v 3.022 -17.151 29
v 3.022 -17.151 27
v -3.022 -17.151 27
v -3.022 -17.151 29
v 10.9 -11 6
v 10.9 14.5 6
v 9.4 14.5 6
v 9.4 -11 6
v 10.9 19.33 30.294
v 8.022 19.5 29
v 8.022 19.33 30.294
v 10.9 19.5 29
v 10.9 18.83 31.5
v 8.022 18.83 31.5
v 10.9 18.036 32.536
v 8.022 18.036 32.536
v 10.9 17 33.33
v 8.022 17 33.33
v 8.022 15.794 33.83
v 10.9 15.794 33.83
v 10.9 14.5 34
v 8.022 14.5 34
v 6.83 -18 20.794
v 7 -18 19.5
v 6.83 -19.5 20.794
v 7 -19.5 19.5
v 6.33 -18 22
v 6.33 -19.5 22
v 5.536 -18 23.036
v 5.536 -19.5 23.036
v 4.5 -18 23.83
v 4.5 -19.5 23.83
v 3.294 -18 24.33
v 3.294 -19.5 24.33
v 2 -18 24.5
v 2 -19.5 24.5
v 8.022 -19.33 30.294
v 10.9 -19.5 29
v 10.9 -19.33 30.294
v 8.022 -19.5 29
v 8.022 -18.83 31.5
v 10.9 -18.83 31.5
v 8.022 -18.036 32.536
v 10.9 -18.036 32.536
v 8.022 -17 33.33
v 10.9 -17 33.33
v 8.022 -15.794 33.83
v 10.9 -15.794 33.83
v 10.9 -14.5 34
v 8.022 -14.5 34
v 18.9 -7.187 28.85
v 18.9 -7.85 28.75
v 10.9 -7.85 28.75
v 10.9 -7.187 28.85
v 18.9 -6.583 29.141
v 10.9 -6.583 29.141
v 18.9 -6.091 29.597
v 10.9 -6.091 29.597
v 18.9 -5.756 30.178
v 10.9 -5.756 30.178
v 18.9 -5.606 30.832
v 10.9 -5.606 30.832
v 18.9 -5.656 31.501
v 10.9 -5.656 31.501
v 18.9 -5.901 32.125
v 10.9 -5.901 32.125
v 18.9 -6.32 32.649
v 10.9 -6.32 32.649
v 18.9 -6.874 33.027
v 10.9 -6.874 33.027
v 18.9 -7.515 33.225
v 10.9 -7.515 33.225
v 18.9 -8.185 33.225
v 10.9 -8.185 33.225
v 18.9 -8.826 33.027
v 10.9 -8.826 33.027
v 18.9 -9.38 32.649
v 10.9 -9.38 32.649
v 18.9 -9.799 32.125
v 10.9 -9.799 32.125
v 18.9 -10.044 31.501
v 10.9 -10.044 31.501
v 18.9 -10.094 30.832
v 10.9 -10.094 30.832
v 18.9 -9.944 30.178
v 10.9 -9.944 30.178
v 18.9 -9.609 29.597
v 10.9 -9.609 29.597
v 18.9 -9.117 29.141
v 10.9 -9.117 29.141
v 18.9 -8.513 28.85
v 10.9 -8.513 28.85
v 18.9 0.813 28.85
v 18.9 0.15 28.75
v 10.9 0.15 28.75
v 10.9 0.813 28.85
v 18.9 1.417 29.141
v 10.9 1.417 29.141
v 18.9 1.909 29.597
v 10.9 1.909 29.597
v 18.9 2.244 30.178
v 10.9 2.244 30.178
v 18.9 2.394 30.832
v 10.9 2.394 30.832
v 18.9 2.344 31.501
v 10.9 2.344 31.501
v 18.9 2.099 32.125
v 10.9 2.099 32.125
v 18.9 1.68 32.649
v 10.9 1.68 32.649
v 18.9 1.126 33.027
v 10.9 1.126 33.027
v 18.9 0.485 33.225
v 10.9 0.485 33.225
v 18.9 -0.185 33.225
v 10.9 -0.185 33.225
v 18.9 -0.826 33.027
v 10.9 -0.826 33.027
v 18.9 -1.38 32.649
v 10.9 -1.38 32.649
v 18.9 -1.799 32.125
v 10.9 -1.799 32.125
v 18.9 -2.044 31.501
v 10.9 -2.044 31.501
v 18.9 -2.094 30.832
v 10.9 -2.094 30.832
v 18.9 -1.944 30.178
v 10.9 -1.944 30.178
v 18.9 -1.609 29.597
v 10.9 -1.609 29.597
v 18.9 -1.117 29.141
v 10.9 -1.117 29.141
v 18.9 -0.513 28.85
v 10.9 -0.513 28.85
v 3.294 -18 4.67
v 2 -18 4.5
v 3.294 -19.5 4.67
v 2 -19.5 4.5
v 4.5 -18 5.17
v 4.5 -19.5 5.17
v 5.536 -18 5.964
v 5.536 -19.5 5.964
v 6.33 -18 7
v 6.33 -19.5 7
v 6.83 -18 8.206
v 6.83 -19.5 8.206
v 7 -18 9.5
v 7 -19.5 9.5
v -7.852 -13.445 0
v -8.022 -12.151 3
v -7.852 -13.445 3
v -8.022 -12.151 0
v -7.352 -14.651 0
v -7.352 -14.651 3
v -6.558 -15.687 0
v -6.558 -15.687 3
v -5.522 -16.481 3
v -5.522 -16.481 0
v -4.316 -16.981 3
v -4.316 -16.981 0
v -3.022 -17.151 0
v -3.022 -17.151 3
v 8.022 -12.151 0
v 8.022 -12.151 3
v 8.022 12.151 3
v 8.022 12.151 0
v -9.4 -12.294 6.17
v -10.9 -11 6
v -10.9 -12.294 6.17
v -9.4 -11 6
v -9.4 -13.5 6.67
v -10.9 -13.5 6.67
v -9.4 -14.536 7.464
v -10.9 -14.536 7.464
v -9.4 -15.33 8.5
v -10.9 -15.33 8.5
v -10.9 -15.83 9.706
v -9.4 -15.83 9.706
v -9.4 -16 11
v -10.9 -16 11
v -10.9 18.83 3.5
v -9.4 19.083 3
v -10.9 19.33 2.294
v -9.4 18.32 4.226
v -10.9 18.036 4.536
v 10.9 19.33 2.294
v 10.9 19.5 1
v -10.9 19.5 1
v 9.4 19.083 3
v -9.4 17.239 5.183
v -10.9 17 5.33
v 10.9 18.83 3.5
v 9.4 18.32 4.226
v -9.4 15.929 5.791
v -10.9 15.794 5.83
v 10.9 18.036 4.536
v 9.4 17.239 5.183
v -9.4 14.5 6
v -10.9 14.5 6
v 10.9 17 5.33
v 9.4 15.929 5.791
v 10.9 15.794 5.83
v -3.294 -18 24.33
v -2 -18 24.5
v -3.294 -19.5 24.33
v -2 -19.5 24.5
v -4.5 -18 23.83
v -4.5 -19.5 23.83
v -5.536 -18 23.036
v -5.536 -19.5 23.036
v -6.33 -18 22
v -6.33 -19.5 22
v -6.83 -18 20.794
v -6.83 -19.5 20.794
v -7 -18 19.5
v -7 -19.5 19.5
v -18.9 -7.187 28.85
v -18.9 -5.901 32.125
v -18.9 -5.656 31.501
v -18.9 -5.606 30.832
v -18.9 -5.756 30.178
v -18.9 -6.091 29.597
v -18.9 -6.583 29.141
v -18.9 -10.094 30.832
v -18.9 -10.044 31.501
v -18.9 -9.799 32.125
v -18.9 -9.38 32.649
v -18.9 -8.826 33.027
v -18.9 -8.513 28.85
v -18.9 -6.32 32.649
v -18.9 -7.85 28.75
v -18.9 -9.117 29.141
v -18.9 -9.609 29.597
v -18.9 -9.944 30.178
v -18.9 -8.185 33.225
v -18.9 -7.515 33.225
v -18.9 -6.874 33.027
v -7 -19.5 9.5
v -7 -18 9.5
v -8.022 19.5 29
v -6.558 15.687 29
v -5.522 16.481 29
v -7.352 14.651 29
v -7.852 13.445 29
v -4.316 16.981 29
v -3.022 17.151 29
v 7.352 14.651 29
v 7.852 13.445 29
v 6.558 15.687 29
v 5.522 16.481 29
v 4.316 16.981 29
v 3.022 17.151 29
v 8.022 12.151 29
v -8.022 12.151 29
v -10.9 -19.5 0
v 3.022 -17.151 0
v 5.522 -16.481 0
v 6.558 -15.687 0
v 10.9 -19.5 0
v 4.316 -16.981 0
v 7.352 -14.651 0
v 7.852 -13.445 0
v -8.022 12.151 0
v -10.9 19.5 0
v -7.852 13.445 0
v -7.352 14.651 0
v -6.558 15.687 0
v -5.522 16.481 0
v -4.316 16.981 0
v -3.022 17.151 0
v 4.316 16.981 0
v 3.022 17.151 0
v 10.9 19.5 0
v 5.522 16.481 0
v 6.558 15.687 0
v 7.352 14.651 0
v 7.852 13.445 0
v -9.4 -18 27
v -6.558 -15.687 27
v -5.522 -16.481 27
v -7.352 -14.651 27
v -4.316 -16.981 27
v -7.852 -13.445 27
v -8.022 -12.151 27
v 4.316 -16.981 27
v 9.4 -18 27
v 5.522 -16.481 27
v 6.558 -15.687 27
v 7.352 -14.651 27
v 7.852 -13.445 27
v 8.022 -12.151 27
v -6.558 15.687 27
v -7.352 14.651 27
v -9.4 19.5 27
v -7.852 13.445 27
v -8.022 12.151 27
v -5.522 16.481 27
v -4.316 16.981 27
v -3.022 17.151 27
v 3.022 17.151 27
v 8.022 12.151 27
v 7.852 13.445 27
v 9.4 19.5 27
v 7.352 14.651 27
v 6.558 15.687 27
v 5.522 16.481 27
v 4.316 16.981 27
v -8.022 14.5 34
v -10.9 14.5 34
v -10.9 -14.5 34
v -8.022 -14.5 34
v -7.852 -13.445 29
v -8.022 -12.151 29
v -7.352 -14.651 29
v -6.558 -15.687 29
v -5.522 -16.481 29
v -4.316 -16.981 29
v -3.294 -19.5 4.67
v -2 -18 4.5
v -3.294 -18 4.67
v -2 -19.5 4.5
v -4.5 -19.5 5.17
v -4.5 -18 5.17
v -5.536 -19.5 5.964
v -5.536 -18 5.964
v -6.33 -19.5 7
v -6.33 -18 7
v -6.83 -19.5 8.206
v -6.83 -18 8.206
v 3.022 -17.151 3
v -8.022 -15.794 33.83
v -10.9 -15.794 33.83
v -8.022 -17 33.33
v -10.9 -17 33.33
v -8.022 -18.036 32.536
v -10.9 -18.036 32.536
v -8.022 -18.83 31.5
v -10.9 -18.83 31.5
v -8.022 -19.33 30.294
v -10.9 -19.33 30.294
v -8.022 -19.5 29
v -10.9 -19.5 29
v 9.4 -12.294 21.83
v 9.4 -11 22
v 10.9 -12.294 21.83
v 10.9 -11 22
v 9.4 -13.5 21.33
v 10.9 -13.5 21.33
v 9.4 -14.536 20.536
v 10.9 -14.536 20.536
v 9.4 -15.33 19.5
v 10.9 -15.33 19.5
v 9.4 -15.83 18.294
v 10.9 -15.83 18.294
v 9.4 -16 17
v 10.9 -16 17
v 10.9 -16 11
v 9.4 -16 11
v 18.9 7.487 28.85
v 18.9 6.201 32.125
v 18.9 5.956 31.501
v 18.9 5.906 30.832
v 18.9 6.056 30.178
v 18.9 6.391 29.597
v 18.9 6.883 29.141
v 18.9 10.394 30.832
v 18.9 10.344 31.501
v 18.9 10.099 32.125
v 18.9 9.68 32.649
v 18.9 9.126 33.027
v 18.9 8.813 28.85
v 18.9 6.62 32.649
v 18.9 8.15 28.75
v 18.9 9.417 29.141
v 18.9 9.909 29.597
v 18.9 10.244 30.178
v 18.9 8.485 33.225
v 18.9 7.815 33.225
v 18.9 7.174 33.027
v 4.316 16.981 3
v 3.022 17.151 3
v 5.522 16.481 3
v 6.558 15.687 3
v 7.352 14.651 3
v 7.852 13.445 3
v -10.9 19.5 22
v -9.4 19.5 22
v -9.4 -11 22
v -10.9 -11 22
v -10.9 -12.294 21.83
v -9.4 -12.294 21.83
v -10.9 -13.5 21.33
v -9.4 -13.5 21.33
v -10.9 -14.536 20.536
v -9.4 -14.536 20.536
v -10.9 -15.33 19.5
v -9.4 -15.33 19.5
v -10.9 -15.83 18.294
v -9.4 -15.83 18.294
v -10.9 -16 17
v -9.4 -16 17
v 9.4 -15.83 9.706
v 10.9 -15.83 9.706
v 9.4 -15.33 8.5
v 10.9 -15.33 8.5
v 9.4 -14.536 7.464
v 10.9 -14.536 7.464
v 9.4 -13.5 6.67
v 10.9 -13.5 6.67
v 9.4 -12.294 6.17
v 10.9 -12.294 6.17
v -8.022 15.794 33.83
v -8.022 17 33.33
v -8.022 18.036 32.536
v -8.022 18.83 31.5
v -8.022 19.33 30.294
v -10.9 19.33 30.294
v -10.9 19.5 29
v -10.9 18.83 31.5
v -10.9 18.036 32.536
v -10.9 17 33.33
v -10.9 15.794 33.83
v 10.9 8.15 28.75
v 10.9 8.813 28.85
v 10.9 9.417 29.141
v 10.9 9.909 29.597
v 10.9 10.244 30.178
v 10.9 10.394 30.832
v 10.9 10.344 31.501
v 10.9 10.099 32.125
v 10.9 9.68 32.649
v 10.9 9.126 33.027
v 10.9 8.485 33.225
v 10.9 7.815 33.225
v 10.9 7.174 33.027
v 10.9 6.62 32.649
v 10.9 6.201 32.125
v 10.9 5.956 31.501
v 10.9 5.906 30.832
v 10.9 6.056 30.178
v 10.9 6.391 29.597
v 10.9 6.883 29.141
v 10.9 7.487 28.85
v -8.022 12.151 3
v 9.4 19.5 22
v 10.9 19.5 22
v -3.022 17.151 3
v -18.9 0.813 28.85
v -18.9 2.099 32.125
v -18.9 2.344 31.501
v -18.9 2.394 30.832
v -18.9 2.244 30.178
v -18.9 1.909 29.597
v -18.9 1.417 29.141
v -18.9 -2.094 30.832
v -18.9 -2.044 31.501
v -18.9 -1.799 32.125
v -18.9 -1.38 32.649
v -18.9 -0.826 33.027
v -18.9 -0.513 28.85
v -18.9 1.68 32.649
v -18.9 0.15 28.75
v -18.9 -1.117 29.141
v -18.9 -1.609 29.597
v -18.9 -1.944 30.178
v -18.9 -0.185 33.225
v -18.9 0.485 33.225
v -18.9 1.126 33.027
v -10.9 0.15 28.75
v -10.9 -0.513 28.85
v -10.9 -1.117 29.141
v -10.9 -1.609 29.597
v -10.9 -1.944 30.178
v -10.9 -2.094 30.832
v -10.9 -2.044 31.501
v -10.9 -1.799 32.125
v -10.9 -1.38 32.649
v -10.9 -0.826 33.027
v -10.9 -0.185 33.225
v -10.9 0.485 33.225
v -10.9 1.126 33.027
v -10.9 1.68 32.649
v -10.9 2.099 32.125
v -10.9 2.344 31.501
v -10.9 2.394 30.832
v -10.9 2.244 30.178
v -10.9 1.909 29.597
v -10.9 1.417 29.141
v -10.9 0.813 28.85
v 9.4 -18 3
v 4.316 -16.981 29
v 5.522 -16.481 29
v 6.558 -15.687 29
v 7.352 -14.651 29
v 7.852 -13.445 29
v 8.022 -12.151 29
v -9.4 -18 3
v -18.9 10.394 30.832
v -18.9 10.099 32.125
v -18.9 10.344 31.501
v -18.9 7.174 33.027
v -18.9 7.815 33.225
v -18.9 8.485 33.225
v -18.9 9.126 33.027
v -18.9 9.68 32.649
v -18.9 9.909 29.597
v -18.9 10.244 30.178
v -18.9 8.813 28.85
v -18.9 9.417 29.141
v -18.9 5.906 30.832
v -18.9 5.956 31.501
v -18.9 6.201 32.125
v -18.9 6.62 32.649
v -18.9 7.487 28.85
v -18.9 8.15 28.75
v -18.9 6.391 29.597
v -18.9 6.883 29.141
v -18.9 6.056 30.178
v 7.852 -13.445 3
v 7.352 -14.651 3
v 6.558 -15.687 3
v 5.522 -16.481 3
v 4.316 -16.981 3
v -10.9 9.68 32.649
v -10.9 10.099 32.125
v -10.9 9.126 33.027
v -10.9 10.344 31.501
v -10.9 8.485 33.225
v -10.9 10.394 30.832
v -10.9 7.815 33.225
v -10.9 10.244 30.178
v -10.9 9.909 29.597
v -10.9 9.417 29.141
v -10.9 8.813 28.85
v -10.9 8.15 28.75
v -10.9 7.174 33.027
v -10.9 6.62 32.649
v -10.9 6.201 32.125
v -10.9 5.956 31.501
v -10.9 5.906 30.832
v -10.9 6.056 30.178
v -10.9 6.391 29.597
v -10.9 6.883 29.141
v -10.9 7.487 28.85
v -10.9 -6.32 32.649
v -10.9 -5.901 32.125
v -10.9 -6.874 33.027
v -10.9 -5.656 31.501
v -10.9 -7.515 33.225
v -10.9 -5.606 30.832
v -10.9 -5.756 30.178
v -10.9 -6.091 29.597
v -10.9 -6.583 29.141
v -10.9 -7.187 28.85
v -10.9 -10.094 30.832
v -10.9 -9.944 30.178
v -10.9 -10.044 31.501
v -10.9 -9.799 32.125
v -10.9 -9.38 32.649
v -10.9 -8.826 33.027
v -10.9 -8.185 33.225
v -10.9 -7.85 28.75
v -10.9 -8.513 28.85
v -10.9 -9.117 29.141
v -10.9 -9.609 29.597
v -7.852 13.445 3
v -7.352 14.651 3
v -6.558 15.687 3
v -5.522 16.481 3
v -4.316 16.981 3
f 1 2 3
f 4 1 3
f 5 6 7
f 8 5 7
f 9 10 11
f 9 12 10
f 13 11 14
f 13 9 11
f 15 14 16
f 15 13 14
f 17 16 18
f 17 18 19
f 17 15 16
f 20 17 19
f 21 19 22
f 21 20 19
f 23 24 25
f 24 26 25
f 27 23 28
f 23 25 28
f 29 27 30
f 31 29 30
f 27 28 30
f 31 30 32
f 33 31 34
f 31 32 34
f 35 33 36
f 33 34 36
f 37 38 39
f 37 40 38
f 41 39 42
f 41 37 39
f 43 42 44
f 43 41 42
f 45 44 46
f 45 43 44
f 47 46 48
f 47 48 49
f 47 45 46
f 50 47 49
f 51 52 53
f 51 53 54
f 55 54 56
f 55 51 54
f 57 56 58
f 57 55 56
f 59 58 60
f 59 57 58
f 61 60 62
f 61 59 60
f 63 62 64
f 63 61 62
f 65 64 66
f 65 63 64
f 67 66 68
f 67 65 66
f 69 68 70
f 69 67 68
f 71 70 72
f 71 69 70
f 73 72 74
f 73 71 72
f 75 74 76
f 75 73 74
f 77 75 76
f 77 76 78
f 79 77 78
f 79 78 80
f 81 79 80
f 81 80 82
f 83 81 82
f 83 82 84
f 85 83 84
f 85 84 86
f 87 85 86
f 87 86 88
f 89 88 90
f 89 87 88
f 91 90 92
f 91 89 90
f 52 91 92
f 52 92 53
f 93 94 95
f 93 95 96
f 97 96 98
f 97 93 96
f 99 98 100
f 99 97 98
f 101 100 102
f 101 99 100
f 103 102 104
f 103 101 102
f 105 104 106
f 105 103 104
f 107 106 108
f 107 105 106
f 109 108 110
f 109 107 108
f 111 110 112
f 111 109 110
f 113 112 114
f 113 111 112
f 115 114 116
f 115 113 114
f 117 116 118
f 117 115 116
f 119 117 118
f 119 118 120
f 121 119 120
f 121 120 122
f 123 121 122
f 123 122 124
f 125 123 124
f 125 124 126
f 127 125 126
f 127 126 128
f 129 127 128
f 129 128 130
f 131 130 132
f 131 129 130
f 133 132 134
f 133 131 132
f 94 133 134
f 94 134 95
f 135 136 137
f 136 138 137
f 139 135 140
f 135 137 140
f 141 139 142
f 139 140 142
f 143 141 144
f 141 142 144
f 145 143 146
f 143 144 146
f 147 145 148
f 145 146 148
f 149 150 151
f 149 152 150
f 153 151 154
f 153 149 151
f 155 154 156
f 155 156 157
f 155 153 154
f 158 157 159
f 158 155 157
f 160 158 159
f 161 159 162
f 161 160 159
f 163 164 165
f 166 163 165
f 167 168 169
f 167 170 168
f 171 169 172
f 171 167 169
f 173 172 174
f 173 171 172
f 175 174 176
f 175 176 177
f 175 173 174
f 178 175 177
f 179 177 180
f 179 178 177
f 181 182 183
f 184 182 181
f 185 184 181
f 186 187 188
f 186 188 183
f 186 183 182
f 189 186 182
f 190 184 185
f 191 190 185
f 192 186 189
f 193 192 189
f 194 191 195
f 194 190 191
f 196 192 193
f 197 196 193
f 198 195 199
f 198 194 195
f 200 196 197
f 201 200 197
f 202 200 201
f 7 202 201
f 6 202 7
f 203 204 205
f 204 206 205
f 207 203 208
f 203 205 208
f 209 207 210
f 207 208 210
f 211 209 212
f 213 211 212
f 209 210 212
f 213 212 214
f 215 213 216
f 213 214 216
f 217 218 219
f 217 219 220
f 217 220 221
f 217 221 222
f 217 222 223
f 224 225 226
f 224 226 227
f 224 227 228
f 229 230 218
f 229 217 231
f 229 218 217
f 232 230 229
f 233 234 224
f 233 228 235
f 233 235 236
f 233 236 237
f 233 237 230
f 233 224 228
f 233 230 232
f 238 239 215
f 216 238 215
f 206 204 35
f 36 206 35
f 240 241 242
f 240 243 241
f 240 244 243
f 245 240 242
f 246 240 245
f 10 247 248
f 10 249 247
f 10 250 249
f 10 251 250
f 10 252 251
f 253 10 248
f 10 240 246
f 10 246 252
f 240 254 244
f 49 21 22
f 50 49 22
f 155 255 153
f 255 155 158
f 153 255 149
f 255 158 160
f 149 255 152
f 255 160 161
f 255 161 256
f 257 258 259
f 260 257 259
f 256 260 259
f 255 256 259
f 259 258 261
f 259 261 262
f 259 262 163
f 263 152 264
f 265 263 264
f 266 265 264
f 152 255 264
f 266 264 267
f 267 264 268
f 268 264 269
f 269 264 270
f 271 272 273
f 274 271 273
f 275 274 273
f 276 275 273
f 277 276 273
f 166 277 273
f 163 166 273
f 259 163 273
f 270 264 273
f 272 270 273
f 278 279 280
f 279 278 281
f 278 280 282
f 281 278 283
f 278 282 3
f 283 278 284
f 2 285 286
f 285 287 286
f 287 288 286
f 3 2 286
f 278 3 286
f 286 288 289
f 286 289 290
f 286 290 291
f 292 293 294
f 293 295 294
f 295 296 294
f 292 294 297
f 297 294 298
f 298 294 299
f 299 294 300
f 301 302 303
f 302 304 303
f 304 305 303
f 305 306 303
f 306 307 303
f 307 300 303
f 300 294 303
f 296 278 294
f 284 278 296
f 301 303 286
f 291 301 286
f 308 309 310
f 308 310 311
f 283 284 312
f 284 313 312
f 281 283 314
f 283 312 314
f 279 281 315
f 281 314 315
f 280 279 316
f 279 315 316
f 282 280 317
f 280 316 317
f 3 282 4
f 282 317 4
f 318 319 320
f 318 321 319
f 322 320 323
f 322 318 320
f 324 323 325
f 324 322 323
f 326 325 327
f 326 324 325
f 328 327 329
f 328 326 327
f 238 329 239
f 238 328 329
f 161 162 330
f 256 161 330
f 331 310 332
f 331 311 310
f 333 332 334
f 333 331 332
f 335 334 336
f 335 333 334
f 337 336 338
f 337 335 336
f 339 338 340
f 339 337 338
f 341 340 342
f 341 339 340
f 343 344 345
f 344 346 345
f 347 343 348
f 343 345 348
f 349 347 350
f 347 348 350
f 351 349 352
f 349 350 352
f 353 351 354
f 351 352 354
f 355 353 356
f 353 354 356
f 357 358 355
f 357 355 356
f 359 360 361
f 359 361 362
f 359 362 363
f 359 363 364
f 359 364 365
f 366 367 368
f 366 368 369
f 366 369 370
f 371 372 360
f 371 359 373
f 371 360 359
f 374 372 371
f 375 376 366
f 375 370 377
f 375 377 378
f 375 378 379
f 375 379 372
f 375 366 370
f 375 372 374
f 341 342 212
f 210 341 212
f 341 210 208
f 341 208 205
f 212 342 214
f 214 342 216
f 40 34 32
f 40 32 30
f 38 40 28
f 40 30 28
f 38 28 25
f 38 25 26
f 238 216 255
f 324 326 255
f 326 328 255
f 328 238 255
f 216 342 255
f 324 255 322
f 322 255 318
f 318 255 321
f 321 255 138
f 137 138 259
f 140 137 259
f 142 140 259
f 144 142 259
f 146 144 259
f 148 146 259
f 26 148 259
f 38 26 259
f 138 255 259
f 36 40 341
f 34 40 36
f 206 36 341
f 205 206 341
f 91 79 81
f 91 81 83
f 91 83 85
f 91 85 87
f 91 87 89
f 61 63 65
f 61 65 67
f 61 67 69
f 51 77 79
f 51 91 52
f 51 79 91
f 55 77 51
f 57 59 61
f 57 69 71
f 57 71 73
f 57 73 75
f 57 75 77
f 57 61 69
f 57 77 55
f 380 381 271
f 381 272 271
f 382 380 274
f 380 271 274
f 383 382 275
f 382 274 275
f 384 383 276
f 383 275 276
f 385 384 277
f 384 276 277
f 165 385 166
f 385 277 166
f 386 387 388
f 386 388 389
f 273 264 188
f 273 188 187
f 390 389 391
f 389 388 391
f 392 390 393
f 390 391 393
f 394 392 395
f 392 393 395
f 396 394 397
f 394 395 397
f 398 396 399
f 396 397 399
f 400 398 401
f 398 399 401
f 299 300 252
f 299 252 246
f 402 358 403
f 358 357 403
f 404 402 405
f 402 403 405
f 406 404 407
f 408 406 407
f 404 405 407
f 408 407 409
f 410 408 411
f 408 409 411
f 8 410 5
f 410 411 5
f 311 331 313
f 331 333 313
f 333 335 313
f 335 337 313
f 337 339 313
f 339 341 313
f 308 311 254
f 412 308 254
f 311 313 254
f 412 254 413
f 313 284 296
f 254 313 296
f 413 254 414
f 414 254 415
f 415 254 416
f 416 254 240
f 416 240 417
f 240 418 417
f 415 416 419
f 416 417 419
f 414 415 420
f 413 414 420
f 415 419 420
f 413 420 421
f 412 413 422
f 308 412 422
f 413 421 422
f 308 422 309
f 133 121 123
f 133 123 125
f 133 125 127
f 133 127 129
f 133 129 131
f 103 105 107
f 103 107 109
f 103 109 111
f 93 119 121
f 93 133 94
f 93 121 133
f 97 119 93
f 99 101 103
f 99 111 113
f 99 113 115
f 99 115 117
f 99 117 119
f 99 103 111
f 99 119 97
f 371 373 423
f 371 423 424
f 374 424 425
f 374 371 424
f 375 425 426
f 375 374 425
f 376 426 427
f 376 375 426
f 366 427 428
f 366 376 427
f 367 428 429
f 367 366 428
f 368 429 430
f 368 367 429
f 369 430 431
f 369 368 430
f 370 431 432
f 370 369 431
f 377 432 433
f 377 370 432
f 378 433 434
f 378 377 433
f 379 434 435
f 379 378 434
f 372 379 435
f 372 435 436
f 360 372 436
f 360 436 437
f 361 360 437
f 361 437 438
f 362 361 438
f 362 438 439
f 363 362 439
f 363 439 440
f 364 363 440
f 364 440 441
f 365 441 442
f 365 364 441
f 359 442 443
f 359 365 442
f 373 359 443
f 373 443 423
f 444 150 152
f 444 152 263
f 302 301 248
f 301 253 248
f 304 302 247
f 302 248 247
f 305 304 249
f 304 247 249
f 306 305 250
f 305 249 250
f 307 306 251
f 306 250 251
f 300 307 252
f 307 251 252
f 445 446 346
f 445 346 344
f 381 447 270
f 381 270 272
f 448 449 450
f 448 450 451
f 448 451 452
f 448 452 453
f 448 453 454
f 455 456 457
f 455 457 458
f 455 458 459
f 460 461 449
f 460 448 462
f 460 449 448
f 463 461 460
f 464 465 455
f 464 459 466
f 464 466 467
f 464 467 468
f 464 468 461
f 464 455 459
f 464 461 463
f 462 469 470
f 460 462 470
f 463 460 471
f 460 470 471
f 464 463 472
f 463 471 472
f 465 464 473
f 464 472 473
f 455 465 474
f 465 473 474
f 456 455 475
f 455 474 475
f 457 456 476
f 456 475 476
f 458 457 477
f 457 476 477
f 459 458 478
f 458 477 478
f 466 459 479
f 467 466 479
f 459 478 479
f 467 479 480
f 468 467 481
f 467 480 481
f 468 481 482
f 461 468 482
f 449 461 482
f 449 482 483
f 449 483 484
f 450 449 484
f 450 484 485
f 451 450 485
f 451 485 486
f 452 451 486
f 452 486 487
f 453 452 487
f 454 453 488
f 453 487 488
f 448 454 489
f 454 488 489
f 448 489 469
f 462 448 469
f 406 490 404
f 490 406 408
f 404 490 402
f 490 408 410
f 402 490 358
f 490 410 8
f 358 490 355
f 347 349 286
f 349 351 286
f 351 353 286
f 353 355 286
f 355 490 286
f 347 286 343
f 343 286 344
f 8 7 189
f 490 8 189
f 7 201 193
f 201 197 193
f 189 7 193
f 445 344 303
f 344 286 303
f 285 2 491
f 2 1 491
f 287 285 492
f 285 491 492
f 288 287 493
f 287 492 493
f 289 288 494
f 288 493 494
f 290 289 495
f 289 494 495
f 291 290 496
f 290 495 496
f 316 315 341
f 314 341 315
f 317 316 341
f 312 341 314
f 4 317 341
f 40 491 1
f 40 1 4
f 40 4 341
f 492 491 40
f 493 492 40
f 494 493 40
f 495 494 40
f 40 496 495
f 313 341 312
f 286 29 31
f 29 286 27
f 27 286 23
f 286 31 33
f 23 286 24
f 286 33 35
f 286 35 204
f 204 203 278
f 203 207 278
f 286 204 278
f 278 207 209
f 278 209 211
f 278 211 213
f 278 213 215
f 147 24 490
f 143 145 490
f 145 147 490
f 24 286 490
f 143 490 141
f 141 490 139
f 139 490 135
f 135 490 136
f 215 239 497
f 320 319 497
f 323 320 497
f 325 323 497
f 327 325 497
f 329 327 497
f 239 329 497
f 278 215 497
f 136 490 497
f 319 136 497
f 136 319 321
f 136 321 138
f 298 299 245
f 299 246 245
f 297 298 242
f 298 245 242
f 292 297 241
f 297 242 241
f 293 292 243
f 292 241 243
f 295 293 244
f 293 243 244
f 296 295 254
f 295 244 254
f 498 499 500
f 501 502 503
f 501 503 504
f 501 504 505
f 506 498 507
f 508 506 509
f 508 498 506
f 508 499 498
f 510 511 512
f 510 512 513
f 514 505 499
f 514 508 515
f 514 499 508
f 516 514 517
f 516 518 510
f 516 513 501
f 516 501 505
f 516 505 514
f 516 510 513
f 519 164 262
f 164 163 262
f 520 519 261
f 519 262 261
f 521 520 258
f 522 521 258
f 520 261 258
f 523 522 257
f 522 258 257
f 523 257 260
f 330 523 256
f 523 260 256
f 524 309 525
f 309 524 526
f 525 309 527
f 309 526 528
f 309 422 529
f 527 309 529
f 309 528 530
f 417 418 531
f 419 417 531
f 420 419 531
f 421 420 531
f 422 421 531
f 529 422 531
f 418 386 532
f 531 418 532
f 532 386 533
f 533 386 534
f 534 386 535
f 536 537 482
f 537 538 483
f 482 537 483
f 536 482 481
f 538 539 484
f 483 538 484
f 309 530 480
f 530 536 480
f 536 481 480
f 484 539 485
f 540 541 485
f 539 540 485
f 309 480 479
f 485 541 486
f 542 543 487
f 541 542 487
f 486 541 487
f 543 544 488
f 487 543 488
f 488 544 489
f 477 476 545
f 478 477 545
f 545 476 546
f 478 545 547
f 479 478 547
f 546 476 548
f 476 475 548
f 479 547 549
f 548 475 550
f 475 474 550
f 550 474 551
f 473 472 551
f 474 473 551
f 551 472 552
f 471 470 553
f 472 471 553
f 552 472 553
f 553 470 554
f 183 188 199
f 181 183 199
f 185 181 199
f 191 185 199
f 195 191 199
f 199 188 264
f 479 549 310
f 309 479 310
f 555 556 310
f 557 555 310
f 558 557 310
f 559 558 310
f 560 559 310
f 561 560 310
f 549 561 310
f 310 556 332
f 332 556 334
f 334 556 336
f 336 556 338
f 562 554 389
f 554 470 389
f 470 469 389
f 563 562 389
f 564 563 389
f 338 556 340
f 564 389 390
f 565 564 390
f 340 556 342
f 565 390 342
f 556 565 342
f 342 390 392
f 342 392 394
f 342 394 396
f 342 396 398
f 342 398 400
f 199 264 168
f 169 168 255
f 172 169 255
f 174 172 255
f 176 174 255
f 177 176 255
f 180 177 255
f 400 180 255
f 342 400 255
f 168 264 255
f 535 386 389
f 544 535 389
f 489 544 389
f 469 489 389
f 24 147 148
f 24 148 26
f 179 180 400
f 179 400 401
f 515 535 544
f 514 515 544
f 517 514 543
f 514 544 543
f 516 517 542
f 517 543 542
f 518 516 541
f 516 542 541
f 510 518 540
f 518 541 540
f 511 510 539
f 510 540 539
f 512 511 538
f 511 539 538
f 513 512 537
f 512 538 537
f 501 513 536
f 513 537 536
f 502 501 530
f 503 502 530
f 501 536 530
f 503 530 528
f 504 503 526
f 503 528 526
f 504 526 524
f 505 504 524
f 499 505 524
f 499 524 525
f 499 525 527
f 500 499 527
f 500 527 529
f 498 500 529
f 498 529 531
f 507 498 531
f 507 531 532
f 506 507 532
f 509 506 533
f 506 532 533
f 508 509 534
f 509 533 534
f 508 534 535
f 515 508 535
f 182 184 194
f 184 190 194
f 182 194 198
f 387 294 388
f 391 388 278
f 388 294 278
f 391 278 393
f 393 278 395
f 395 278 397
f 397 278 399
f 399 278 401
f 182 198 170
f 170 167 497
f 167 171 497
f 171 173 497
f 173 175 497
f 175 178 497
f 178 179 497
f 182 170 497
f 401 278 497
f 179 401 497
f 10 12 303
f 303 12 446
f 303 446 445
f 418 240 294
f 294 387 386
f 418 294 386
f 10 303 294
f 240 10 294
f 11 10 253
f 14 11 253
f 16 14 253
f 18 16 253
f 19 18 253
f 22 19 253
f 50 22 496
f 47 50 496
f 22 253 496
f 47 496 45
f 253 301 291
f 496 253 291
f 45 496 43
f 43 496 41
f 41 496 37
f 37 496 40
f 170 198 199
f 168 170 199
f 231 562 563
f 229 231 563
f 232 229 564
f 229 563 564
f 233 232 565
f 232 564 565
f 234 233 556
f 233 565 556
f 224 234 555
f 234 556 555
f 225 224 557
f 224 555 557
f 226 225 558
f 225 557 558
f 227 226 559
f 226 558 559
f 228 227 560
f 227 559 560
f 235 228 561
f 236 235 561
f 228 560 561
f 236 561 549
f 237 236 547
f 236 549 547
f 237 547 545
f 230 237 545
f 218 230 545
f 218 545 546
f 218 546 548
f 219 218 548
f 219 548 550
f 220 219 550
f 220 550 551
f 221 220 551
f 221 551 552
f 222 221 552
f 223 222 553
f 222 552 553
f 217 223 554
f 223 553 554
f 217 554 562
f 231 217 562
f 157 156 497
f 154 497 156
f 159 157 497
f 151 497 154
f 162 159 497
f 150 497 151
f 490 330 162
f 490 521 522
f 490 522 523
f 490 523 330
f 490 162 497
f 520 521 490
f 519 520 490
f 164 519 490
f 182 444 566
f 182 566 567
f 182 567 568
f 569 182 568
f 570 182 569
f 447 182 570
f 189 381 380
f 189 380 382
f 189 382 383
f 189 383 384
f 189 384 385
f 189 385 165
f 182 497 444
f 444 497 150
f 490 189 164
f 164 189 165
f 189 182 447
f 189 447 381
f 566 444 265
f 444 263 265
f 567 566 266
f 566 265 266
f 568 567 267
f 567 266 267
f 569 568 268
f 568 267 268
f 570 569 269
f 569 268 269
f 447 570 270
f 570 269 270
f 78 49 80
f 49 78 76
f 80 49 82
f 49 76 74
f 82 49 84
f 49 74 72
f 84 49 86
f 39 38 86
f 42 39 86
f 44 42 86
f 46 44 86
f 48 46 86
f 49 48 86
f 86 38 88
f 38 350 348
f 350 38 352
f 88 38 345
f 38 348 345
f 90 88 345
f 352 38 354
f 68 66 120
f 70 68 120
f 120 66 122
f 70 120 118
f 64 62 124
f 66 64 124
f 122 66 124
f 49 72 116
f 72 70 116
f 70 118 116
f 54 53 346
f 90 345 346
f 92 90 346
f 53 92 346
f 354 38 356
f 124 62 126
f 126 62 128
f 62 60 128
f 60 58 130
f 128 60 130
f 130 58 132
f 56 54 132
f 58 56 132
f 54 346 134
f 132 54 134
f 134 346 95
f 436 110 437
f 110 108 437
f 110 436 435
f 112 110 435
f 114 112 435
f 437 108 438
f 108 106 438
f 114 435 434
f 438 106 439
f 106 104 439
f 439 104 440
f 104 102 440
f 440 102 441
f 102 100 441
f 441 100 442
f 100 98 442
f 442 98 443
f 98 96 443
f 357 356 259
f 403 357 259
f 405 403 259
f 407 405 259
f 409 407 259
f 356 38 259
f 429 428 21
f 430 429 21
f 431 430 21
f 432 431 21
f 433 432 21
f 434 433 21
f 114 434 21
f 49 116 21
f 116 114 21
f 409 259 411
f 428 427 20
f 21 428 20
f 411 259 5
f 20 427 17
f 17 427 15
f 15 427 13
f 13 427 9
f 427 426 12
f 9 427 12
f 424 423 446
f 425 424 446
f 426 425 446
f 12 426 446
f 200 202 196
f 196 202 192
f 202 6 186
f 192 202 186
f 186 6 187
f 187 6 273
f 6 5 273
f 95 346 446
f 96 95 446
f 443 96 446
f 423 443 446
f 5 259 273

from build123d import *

# Parameters (mm, degrees)
SKETCH1_W               = 21.8
SKETCH1_H               = 39
BOSS_EXTRUDE1_DEPTH     = 3
BOSS_EXTRUDE2_DEPTH     = 3
BOSS_EXTRUDE4_DEPTH     = 21
SKETCH4_W               = 21.8
SKETCH4_H               = 39
BOSS_EXTRUDE5_DEPTH     = 2
CUT_EXTRUDE1_DEPTH      = 50.807730324
CUT_EXTRUDE1_DEPTH_BACK = 50.807730324
SKETCH5_W               = 14
SKETCH5_H               = 20
BOSS_EXTRUDE6_DEPTH     = 5
SKETCH7_W               = 14.6
SKETCH7_H               = 1.5
CUT_EXTRUDE2_DEPTH      = 2
SKETCH8_W               = 16.04420395
SKETCH8_H               = 34.30198165
CUT_EXTRUDE3_DEPTH      = 35.279148181
SKETCH9_W               = 16.04420395
SKETCH9_H               = 34.30198165
CUT_EXTRUDE4_DEPTH      = 2
SKETCH10_W              = 2.1
SKETCH10_H              = 1.5
CUT_EXTRUDE5_DEPTH      = 2
SKETCH11_W              = 2.1
SKETCH11_H              = 1.5
CUT_EXTRUDE6_DEPTH      = 2
SKETCH13_W              = 18.8
SKETCH13_H              = 1.5
CUT_EXTRUDE7_DEPTH      = 3
FILLET3_R               = 5
FILLET4_R               = 5
SKETCH17_W              = 1.5
SKETCH17_H              = 16
BOSS_EXTRUDE8_DEPTH     = 2
FILLET5_R               = 5
BOSS_EXTRUDE9_DEPTH     = 5
SKETCH24_R              = 2.25
BOSS_EXTRUDE10_DEPTH    = 8
BOSS_EXTRUDE11_START    = 8
SKETCH25_R              = 2.25
BOSS_EXTRUDE11_DEPTH    = 8
FILLET7_R               = 5


with BuildPart() as part:
    # Sketch1 → Boss-Extrude1 (new body)
    with BuildSketch(Plane.XY):
        Rectangle(SKETCH1_W, SKETCH1_H)
    extrude(amount=BOSS_EXTRUDE1_DEPTH)

    # Sketch2 → Boss-Extrude2 (add)
    with BuildSketch(Plane.XY.offset(3)):
        Polygon((-10.9, 19.5), (-9.4, 19.5), (-9.4, -18), (9.4, -18), (9.4, 19.5), (10.9, 19.5), (10.9, -19.5), (-10.9, -19.5), align=None)
    extrude(amount=BOSS_EXTRUDE2_DEPTH)

    # Sketch3 → Boss-Extrude4 (add)
    with BuildSketch(Plane.XY.offset(6)):
        Polygon((-9.4, -18), (-10.9, -18), (-10.9, -19.5), (10.9, -19.5), (10.9, -18), align=None)
    extrude(amount=BOSS_EXTRUDE4_DEPTH)

    # Sketch4 → Boss-Extrude5 (add)
    with BuildSketch(Plane.XY.offset(27)):
        Rectangle(SKETCH4_W, SKETCH4_H)
    extrude(amount=BOSS_EXTRUDE5_DEPTH)

    # Sketch5 → Cut-Extrude1 (cut, two sides: drawn at the far end of the back side and taken through both)
    with BuildSketch(Plane.XZ.offset(19.5).offset(-CUT_EXTRUDE1_DEPTH_BACK)):
        with Locations((0, 14.5)):
            Rectangle(SKETCH5_W, SKETCH5_H)
    extrude(amount=CUT_EXTRUDE1_DEPTH + CUT_EXTRUDE1_DEPTH_BACK, mode=Mode.SUBTRACT)

    # Sketch6 → Boss-Extrude6 (add)
    with BuildSketch(Plane(origin=(0, 0, 27), x_dir=(-1, 0, 0), z_dir=(0, 0, -1))):
        Polygon((-9.4, -18), (-9.4, 18), (9.4, 18), (9.4, -18), (10.9, -18), (10.9, 19.5), (-10.9, 19.5), (-10.9, -18), align=None)
    extrude(amount=BOSS_EXTRUDE6_DEPTH)

    # Sketch7 → Cut-Extrude2 (cut)
    with BuildSketch(Plane(origin=(0, 0, 22), x_dir=(-1, 0, 0), z_dir=(0, 0, -1))):
        with Locations((0, 18.75)):
            Rectangle(SKETCH7_W, SKETCH7_H)
    extrude(amount=-CUT_EXTRUDE2_DEPTH, mode=Mode.SUBTRACT)

    # Sketch8 → Cut-Extrude3 (cut, through all)
    with BuildSketch(Plane.XY.offset(3)):
        Rectangle(SKETCH8_W, SKETCH8_H)
    extrude(amount=-CUT_EXTRUDE3_DEPTH, mode=Mode.SUBTRACT)

    # Sketch9 → Cut-Extrude4 (cut)
    with BuildSketch(Plane(origin=(0, 0, 27), x_dir=(-1, 0, 0), z_dir=(0, 0, -1))):
        Rectangle(SKETCH9_W, SKETCH9_H)
    extrude(amount=-CUT_EXTRUDE4_DEPTH, mode=Mode.SUBTRACT)

    # Sketch10 → Cut-Extrude5 (cut)
    with BuildSketch(Plane(origin=(0, 0, 22), x_dir=(-1, 0, 0), z_dir=(0, 0, -1))):
        with Locations((8.35, 18.75)):
            Rectangle(SKETCH10_W, SKETCH10_H)
    extrude(amount=-CUT_EXTRUDE5_DEPTH, mode=Mode.SUBTRACT)

    # Sketch11 → Cut-Extrude6 (cut)
    with BuildSketch(Plane(origin=(0, 0, 22), x_dir=(-1, 0, 0), z_dir=(0, 0, -1))):
        with Locations((-8.35, 18.75)):
            Rectangle(SKETCH11_W, SKETCH11_H)
    extrude(amount=-CUT_EXTRUDE6_DEPTH, mode=Mode.SUBTRACT)

    # Sketch13 → Cut-Extrude7 (cut)
    with BuildSketch(Plane(origin=(0, 0, 24), x_dir=(-1, 0, 0), z_dir=(0, 0, -1))):
        with Locations((0, 18.75)):
            Rectangle(SKETCH13_W, SKETCH13_H)
    extrude(amount=-CUT_EXTRUDE7_DEPTH, mode=Mode.SUBTRACT)

    # Fillet3
    fillet3_edges = [part.edges().sort_by_distance(p)[0] for p in [
        (8.022101975, 17.150990825, 1.5),
        (8.022101975, -17.150990825, 1.5),
        (-8.022101975, -17.150990825, 1.5),
        (-8.022101975, 17.150990825, 1.5),
        (-8.022101975, -17.150990825, 28),
        (8.022101975, -17.150990825, 28),
    ]]
    fillet(fillet3_edges, radius=FILLET3_R)

    # Fillet4
    fillet4_edges = [part.edges().sort_by_distance(p)[0] for p in [
        (-8.022101975, 17.150990825, 28),
        (8.022101975, 17.150990825, 28),
    ]]
    fillet(fillet4_edges, radius=FILLET4_R)

    # Sketch17 → Boss-Extrude8 (add)
    with BuildSketch(Plane(origin=(0, -18, 0), x_dir=(1, 0, 0), z_dir=(0, 1, 0))):
        with Locations((-10.15, -14)):
            Rectangle(SKETCH17_W, SKETCH17_H)
        with Locations((10.15, -14)):
            Rectangle(SKETCH17_W, SKETCH17_H)
    extrude(amount=BOSS_EXTRUDE8_DEPTH)

    # Fillet5
    fillet5_edges = [part.edges().sort_by_distance(p)[0] for p in [
        (-10.15, -16, 22),
        (-10.15, -16, 6),
        (10.15, -16, 6),
        (10.15, -16, 22),
        (7, -18.75, 24.5),
        (7, -18.75, 4.5),
        (-7, -18.75, 4.5),
        (-7, -18.75, 24.5),
    ]]
    fillet(fillet5_edges, radius=FILLET5_R)

    # Sketch19 → Boss-Extrude9 (add)
    with BuildSketch(Plane.XY.offset(29)):
        Polygon((-10.9, 19.5), (-10.9, -19.5), (-8.022101975, -19.5), (-8.022101975, -12.150990825), (-8.022101975, 12.150990825), (-8.022101975, 19.5), align=None)
        Polygon((8.022101975, 12.150990825), (8.022101975, 19.5), (10.9, 19.5), (10.9, -19.5), (8.022101975, -19.5), align=None)
    extrude(amount=BOSS_EXTRUDE9_DEPTH)

    # Sketch24 → Boss-Extrude10 (add)
    with BuildSketch(Plane.ZY.offset(10.9)):
        with Locations(Location((31, 8.15, 0), (0, 0, 180))):
            Circle(SKETCH24_R)
        with Locations(Location((31, 0.15, 0), (0, 0, 180))):
            Circle(SKETCH24_R)
        with Locations(Location((31, -7.85, 0), (0, 0, 180))):
            Circle(SKETCH24_R)
    extrude(amount=BOSS_EXTRUDE10_DEPTH)

    # Sketch25 → Boss-Extrude11 (add)
    with BuildSketch(Plane(origin=(10.9, 0, 0), x_dir=(0, 0, -1), z_dir=(1, 0, 0)).offset(BOSS_EXTRUDE11_START)):
        with Locations((-31, 8.15)):
            Circle(SKETCH25_R)
        with Locations((-31, 0.15)):
            Circle(SKETCH25_R)
        with Locations((-31, -7.85)):
            Circle(SKETCH25_R)
    extrude(amount=-BOSS_EXTRUDE11_DEPTH)

    # Fillet7
    fillet7_edges = [part.edges().sort_by_distance(p)[0] for p in [
        (-9.461050988, -19.5, 34),
        (9.461050988, -19.5, 34),
        (-10.15, 19.5, 6),
        (9.461050988, 19.5, 34),
        (-9.461050988, 19.5, 34),
    ]]
    fillet(fillet7_edges, radius=FILLET7_R - 0.0001)  # a hair under: the kernel refuses the full size


solid = part.part
